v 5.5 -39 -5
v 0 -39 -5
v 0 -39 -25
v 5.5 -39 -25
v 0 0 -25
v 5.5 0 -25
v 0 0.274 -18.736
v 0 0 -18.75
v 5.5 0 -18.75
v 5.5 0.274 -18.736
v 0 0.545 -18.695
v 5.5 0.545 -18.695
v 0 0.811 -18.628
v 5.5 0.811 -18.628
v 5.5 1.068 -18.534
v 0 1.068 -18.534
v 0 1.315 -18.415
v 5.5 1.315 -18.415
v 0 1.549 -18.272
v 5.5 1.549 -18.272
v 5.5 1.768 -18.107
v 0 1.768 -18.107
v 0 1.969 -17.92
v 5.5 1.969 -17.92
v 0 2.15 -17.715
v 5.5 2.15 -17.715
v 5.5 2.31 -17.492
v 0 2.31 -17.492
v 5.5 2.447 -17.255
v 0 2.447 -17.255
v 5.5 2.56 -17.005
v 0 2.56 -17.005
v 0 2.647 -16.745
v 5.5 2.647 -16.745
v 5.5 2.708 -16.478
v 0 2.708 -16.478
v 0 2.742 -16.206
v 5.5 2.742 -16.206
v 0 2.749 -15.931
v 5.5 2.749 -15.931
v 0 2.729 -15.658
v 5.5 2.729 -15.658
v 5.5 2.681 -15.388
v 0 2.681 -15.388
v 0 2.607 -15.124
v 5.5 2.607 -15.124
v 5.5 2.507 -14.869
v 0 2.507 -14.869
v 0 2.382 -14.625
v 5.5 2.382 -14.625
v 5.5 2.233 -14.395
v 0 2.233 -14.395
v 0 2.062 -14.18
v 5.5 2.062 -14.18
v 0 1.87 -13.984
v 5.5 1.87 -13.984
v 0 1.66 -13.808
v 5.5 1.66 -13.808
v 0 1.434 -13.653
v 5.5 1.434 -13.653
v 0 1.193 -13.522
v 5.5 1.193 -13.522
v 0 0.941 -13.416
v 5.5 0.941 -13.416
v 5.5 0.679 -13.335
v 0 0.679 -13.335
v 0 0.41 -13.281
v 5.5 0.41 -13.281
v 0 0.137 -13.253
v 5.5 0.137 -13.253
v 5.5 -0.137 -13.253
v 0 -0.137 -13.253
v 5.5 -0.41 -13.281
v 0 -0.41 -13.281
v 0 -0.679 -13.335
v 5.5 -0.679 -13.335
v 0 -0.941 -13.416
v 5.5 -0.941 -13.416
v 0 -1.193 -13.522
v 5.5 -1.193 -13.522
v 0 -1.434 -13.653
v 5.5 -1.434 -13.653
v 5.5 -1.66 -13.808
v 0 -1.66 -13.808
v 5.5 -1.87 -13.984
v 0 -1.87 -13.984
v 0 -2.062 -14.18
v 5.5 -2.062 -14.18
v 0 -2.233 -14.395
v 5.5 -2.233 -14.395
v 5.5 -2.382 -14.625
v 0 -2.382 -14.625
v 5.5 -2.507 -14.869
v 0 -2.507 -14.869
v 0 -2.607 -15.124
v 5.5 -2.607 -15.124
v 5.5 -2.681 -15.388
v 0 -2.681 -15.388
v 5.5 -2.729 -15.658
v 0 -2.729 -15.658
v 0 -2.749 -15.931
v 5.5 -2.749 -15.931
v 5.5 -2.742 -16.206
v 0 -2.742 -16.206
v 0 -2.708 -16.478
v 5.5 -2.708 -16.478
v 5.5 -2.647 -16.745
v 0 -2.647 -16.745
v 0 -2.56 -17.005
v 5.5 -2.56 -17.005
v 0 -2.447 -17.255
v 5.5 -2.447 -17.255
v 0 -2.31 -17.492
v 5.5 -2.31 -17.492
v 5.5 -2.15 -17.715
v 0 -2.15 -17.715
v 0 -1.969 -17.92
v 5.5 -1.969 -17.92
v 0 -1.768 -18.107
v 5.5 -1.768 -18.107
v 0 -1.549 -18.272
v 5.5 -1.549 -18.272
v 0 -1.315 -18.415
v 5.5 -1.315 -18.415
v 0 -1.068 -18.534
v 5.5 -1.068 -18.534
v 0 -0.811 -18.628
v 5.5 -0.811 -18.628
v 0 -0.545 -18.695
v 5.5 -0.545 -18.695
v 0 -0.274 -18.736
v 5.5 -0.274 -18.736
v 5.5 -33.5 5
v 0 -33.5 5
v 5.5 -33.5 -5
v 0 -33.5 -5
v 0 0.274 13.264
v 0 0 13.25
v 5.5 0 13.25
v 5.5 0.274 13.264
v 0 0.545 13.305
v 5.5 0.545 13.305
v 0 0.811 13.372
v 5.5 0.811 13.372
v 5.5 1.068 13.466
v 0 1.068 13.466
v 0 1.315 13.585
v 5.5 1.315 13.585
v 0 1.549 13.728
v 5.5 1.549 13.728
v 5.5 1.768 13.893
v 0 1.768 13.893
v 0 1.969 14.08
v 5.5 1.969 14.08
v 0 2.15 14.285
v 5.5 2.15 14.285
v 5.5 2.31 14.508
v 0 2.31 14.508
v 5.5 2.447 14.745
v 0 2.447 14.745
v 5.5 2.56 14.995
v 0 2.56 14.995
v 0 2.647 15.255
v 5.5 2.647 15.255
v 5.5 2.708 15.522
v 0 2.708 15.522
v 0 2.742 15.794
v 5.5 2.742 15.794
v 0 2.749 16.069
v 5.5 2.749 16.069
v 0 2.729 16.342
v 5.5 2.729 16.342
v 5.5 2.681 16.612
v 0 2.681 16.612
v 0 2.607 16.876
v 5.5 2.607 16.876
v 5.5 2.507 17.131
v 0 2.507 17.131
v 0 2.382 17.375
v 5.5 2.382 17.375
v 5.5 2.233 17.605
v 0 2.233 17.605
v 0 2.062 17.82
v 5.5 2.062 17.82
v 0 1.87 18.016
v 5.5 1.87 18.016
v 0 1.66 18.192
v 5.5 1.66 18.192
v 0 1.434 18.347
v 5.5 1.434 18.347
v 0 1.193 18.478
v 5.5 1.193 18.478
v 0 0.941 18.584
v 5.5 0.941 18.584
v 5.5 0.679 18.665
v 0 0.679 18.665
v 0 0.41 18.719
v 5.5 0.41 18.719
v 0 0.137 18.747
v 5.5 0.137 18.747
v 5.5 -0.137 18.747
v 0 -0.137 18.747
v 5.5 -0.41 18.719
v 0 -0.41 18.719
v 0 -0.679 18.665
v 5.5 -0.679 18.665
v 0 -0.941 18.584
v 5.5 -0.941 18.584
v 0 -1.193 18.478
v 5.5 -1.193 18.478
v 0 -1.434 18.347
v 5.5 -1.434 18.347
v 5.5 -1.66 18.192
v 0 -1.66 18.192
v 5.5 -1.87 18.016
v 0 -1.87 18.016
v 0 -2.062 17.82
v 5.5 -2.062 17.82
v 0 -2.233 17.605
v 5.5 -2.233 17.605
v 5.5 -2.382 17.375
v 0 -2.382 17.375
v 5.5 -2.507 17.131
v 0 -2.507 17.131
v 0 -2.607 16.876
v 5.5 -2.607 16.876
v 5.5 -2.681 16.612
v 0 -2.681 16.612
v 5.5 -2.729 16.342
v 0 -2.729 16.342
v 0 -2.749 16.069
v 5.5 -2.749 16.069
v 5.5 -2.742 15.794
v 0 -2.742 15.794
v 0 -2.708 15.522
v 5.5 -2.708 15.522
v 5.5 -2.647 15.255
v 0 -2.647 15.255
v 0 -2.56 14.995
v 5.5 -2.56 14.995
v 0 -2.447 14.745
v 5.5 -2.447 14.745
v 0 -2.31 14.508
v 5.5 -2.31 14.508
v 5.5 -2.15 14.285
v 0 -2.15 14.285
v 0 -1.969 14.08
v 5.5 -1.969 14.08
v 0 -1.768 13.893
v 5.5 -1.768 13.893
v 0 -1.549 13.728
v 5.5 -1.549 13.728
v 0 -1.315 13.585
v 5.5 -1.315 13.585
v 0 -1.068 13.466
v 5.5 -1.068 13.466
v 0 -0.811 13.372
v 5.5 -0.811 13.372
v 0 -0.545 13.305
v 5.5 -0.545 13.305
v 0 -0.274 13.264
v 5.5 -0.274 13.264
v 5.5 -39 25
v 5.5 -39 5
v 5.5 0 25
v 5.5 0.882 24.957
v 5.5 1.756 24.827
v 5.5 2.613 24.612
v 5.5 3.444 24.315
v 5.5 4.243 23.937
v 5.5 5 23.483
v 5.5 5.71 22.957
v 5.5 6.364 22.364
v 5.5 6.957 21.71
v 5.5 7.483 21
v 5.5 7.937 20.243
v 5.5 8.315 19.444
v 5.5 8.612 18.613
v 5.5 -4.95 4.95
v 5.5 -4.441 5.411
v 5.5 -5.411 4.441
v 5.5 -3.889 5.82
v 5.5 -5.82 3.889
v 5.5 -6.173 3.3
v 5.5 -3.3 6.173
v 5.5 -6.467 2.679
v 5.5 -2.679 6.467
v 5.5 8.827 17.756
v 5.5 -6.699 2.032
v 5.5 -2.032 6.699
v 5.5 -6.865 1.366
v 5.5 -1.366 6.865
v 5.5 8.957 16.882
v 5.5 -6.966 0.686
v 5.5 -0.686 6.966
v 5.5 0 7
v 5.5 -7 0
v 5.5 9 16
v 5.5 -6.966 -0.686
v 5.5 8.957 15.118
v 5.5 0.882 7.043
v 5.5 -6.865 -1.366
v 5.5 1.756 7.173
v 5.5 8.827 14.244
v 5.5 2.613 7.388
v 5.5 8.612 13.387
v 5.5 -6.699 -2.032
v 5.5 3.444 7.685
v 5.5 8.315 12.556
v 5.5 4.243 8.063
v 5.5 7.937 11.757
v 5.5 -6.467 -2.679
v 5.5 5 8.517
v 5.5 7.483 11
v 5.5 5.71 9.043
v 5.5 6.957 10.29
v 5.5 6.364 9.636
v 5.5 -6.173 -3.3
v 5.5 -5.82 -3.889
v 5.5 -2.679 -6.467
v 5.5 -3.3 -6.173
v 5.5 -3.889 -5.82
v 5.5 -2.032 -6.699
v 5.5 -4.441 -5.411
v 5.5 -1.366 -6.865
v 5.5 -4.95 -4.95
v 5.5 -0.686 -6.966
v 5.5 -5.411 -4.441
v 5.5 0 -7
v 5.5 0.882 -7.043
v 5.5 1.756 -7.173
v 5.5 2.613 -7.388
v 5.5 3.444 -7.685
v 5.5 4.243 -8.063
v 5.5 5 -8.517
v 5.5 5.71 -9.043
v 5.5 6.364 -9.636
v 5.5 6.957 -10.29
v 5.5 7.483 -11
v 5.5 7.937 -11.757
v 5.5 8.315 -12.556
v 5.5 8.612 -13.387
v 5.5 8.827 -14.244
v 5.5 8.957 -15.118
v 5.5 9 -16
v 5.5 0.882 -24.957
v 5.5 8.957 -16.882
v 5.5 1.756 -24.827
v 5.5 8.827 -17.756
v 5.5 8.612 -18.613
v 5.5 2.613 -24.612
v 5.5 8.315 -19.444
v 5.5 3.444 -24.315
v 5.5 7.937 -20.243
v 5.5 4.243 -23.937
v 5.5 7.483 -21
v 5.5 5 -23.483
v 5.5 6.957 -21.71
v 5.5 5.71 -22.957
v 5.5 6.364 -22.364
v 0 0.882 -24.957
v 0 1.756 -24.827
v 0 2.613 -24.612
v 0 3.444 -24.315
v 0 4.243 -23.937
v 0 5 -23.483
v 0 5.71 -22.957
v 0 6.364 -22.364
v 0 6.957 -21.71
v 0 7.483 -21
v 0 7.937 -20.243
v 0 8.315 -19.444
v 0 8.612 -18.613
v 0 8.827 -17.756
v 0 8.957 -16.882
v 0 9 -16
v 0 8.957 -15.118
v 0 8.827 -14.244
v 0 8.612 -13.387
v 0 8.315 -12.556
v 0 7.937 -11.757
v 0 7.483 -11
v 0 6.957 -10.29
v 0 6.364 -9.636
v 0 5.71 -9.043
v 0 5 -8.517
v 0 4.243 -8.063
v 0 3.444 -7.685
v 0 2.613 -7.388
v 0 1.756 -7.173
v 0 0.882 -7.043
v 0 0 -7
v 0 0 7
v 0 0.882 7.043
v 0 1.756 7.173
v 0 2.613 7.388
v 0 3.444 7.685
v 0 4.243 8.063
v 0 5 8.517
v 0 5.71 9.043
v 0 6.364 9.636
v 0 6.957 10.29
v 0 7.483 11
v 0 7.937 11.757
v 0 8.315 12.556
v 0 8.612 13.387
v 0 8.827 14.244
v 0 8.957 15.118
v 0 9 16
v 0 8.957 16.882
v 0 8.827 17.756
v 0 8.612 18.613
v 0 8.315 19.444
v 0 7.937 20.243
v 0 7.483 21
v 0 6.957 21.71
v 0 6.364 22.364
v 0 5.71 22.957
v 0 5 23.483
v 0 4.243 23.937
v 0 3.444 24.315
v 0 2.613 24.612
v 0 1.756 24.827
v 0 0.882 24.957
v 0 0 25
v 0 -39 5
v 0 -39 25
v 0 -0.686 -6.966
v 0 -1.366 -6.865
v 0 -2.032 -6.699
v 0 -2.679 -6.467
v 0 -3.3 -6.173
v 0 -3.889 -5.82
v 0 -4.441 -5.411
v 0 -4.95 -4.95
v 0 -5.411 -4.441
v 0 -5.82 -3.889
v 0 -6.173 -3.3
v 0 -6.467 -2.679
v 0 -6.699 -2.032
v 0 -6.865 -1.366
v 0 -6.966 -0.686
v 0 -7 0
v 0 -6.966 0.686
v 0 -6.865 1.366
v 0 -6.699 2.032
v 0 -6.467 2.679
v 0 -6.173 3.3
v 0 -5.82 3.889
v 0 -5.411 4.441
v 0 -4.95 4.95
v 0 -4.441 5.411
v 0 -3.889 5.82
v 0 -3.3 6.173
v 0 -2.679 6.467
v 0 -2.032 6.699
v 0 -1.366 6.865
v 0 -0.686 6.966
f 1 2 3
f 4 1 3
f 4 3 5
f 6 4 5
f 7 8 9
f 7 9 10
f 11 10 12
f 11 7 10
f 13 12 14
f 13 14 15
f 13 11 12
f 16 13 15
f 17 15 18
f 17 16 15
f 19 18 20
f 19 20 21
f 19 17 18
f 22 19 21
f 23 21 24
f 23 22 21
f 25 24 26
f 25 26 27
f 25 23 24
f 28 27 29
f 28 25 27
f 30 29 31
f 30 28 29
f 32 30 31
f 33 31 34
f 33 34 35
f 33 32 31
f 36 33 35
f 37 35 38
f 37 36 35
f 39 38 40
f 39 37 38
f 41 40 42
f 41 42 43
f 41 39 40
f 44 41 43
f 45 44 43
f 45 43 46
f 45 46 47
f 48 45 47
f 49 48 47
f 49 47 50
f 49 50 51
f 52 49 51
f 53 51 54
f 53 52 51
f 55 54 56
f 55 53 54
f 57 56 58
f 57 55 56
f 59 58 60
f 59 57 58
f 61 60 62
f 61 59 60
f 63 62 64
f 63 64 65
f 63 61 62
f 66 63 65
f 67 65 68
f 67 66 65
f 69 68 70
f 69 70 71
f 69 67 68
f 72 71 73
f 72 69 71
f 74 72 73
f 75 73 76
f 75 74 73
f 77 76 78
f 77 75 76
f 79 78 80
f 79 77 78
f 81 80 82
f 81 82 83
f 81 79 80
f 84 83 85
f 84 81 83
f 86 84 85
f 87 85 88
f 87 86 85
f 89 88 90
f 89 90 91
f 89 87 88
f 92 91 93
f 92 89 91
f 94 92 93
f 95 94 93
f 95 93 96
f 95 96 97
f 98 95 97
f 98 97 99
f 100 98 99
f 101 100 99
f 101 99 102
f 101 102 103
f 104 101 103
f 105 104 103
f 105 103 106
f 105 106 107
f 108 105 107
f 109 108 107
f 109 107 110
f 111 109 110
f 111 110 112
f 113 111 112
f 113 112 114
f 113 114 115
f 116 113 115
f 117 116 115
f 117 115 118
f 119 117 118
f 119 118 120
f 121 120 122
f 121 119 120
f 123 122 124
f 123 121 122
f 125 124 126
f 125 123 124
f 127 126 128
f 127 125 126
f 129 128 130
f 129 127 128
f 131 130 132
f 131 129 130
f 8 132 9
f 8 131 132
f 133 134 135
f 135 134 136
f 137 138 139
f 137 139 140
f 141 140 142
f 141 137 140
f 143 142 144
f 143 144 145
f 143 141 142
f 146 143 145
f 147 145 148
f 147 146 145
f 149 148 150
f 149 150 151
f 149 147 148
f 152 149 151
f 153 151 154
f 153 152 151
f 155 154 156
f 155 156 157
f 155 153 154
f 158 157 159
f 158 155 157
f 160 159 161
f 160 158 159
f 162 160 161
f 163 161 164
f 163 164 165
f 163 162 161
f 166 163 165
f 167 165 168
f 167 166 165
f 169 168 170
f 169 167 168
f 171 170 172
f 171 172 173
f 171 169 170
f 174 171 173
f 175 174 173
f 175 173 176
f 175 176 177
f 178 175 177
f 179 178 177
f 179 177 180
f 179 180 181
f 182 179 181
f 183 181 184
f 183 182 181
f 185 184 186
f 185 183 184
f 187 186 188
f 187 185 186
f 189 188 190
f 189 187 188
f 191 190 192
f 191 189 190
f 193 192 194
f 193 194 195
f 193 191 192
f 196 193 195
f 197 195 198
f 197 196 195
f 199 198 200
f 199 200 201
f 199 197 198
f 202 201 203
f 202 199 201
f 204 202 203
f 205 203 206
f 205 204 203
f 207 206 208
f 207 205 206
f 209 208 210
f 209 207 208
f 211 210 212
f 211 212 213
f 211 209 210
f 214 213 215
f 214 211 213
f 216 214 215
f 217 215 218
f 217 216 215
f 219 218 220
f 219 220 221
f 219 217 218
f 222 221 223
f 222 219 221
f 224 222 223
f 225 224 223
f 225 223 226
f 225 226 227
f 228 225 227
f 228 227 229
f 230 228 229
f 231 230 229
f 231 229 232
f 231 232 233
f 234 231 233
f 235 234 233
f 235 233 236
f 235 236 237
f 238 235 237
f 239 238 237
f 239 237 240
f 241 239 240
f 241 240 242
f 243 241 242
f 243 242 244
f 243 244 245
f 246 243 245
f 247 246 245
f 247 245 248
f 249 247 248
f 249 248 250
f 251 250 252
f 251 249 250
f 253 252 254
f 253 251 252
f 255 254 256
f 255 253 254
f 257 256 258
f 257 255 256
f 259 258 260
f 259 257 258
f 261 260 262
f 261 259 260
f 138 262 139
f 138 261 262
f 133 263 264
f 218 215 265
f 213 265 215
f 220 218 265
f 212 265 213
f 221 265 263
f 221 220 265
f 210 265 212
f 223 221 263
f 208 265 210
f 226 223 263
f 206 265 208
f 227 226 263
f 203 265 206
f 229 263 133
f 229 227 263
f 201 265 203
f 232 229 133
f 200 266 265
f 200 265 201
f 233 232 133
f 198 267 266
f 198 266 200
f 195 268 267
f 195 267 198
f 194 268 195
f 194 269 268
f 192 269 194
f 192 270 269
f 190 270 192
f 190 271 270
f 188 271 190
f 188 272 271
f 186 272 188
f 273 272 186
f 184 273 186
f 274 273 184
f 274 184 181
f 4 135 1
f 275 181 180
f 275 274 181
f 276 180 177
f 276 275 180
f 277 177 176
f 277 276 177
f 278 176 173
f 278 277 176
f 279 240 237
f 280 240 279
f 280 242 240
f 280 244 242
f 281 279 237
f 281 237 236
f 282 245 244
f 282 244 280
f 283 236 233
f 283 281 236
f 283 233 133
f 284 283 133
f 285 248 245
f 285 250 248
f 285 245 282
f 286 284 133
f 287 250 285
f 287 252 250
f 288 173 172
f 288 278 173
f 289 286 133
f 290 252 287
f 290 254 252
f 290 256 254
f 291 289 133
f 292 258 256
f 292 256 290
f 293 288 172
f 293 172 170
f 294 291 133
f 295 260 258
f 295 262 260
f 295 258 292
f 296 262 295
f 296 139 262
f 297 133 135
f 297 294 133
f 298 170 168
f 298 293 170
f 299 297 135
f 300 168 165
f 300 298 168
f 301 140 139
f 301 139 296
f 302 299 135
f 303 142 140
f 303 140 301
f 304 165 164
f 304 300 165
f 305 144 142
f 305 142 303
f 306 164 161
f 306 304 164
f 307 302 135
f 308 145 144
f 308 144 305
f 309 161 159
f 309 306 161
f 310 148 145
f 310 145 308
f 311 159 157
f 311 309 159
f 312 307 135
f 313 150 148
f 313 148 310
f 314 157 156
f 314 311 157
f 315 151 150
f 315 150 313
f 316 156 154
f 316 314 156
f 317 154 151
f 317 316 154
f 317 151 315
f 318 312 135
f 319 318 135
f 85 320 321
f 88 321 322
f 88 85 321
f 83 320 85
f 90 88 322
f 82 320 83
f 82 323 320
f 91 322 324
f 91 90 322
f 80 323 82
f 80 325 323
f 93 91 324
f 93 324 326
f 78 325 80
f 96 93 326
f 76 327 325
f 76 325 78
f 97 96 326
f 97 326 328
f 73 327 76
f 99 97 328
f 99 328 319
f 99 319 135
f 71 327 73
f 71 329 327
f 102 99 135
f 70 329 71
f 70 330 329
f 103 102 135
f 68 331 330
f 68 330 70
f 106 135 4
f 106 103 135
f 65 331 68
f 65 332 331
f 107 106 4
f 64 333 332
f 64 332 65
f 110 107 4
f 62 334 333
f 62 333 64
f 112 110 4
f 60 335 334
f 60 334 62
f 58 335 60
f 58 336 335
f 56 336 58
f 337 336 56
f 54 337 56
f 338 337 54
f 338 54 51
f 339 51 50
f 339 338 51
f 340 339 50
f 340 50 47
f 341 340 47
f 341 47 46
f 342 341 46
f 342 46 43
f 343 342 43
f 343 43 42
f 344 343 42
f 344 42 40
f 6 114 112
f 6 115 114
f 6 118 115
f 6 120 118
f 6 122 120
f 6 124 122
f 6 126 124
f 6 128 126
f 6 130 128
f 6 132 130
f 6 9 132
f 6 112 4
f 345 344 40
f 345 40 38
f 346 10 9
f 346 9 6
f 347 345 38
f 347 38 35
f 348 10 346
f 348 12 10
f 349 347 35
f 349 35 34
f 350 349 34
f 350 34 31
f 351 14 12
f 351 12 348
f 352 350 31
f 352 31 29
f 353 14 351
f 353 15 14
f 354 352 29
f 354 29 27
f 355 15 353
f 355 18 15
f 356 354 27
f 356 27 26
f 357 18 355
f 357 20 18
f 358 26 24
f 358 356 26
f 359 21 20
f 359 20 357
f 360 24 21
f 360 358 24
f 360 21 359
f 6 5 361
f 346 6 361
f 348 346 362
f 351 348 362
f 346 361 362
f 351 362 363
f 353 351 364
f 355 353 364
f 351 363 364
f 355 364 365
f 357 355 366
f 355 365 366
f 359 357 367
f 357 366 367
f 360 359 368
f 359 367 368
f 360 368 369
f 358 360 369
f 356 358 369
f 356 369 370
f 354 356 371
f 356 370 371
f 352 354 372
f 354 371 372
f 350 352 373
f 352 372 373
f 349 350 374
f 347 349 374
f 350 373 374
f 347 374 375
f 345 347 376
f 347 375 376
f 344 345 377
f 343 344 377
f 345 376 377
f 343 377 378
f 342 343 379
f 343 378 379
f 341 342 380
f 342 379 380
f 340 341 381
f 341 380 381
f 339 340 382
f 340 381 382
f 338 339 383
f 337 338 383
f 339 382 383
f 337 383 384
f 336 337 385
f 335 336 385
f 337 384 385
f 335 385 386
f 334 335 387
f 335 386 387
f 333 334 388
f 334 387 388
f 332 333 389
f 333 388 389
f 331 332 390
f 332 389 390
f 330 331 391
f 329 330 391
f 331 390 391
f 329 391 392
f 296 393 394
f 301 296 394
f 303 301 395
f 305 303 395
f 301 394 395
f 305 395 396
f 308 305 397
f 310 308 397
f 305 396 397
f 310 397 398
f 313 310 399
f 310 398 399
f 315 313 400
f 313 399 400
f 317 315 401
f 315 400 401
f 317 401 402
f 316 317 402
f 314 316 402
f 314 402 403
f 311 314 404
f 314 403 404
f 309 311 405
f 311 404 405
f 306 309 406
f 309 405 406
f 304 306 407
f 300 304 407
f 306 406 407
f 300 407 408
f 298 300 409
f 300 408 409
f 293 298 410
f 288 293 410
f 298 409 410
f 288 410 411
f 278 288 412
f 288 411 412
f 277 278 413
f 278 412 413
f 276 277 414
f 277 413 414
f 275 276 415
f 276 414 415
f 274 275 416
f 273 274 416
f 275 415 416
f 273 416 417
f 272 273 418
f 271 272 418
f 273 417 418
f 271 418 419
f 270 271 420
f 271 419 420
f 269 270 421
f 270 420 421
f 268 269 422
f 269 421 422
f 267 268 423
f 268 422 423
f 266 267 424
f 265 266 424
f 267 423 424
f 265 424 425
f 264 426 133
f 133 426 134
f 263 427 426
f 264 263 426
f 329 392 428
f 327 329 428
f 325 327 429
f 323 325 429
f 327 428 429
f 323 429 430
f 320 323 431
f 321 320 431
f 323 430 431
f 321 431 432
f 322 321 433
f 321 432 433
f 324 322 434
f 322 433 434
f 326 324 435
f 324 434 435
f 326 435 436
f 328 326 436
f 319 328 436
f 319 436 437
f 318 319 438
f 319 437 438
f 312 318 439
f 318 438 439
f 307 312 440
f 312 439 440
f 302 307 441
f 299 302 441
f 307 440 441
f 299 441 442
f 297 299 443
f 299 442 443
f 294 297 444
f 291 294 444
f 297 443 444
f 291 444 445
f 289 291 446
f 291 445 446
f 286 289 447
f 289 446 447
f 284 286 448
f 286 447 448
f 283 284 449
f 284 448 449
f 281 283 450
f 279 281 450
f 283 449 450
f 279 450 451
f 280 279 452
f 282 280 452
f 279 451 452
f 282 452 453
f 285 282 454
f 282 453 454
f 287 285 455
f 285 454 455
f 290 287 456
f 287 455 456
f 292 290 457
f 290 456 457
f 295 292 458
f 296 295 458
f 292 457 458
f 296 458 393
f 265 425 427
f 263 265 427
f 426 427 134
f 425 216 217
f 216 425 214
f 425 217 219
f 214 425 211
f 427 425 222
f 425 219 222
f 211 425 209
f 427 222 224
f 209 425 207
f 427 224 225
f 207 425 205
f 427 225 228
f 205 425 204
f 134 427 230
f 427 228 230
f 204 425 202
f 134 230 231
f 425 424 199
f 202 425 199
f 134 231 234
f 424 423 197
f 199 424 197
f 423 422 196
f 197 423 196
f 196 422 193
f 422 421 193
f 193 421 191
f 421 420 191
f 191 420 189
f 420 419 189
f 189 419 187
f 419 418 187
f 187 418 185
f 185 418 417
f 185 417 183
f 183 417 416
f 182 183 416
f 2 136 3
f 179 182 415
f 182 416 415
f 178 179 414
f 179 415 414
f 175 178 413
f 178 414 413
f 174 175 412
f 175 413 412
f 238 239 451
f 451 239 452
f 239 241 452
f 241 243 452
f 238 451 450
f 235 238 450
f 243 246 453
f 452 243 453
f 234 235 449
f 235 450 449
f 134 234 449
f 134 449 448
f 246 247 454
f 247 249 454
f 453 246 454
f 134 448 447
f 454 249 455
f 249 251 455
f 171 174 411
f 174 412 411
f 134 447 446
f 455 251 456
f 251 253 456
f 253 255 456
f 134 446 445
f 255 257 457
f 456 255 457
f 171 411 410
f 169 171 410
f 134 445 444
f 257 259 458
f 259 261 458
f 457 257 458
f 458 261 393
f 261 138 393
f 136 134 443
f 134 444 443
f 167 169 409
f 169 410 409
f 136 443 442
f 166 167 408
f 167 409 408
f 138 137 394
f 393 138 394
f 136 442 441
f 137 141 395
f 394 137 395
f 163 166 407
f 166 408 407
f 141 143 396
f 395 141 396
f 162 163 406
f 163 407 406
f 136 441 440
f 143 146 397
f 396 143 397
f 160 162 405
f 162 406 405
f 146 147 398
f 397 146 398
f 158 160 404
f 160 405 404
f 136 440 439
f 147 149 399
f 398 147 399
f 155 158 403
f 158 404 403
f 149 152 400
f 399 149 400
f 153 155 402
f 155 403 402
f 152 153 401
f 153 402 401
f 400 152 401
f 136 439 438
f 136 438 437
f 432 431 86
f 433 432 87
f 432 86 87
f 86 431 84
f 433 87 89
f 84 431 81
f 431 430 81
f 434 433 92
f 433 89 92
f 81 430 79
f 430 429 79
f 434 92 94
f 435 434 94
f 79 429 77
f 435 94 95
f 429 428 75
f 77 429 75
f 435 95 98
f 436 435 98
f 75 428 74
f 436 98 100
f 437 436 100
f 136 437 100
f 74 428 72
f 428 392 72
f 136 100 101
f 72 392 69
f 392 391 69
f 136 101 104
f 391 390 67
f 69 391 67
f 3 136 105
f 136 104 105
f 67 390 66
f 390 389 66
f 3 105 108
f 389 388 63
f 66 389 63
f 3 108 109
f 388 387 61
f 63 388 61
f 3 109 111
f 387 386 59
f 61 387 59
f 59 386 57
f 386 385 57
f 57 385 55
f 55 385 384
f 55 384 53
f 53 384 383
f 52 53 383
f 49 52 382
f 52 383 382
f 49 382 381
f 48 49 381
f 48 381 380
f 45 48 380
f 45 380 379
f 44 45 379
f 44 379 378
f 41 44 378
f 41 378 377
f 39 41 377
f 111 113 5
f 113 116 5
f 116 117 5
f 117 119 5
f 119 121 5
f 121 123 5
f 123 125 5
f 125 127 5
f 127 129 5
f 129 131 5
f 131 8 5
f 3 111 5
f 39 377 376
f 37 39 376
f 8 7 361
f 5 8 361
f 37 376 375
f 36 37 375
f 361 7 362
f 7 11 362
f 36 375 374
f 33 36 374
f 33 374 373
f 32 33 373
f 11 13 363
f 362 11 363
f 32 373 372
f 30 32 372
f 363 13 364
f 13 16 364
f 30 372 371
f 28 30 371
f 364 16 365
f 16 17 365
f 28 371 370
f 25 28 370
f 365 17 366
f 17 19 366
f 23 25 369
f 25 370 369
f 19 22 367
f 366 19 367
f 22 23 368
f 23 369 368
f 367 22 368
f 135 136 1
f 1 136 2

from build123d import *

# Parameters (mm, degrees)
CROQUIS1_R              = 2.75
SALIENTE_EXTRUIR1_DEPTH = 5.5


with BuildPart() as part:
    # Croquis1 → Saliente-Extruir1 (new body)
    with BuildSketch(Plane(origin=(0, 0, 0), x_dir=(0, 0, -1), z_dir=(1, 0, 0))):
        with BuildLine():
            Line((-25, 0), (-25, -33.5))
            Line((-25, -33.5), (-25, -39))
            Line((-25, -39), (-5, -39))
            Line((-5, -39), (-5, -33.5))
            Line((-5, -33.5), (5, -33.5))
            Line((5, -33.5), (5, -39))
            Line((5, -39), (25, -39))
            Line((25, -39), (25, -33.5))
            Line((25, -33.5), (25, 0))
            ThreePointArc((25, 0), (16, 9), (7, 0))
            ThreePointArc((7, 0), (0, -7), (-7, 0))
            ThreePointArc((-7, 0), (-16, 9), (-25, 0))
        make_face()
        with Locations((-16, 0)):
            Circle(CROQUIS1_R, mode=Mode.SUBTRACT)
        with Locations((16, 0)):
            Circle(CROQUIS1_R, mode=Mode.SUBTRACT)
    extrude(amount=SALIENTE_EXTRUIR1_DEPTH)


solid = part.part
